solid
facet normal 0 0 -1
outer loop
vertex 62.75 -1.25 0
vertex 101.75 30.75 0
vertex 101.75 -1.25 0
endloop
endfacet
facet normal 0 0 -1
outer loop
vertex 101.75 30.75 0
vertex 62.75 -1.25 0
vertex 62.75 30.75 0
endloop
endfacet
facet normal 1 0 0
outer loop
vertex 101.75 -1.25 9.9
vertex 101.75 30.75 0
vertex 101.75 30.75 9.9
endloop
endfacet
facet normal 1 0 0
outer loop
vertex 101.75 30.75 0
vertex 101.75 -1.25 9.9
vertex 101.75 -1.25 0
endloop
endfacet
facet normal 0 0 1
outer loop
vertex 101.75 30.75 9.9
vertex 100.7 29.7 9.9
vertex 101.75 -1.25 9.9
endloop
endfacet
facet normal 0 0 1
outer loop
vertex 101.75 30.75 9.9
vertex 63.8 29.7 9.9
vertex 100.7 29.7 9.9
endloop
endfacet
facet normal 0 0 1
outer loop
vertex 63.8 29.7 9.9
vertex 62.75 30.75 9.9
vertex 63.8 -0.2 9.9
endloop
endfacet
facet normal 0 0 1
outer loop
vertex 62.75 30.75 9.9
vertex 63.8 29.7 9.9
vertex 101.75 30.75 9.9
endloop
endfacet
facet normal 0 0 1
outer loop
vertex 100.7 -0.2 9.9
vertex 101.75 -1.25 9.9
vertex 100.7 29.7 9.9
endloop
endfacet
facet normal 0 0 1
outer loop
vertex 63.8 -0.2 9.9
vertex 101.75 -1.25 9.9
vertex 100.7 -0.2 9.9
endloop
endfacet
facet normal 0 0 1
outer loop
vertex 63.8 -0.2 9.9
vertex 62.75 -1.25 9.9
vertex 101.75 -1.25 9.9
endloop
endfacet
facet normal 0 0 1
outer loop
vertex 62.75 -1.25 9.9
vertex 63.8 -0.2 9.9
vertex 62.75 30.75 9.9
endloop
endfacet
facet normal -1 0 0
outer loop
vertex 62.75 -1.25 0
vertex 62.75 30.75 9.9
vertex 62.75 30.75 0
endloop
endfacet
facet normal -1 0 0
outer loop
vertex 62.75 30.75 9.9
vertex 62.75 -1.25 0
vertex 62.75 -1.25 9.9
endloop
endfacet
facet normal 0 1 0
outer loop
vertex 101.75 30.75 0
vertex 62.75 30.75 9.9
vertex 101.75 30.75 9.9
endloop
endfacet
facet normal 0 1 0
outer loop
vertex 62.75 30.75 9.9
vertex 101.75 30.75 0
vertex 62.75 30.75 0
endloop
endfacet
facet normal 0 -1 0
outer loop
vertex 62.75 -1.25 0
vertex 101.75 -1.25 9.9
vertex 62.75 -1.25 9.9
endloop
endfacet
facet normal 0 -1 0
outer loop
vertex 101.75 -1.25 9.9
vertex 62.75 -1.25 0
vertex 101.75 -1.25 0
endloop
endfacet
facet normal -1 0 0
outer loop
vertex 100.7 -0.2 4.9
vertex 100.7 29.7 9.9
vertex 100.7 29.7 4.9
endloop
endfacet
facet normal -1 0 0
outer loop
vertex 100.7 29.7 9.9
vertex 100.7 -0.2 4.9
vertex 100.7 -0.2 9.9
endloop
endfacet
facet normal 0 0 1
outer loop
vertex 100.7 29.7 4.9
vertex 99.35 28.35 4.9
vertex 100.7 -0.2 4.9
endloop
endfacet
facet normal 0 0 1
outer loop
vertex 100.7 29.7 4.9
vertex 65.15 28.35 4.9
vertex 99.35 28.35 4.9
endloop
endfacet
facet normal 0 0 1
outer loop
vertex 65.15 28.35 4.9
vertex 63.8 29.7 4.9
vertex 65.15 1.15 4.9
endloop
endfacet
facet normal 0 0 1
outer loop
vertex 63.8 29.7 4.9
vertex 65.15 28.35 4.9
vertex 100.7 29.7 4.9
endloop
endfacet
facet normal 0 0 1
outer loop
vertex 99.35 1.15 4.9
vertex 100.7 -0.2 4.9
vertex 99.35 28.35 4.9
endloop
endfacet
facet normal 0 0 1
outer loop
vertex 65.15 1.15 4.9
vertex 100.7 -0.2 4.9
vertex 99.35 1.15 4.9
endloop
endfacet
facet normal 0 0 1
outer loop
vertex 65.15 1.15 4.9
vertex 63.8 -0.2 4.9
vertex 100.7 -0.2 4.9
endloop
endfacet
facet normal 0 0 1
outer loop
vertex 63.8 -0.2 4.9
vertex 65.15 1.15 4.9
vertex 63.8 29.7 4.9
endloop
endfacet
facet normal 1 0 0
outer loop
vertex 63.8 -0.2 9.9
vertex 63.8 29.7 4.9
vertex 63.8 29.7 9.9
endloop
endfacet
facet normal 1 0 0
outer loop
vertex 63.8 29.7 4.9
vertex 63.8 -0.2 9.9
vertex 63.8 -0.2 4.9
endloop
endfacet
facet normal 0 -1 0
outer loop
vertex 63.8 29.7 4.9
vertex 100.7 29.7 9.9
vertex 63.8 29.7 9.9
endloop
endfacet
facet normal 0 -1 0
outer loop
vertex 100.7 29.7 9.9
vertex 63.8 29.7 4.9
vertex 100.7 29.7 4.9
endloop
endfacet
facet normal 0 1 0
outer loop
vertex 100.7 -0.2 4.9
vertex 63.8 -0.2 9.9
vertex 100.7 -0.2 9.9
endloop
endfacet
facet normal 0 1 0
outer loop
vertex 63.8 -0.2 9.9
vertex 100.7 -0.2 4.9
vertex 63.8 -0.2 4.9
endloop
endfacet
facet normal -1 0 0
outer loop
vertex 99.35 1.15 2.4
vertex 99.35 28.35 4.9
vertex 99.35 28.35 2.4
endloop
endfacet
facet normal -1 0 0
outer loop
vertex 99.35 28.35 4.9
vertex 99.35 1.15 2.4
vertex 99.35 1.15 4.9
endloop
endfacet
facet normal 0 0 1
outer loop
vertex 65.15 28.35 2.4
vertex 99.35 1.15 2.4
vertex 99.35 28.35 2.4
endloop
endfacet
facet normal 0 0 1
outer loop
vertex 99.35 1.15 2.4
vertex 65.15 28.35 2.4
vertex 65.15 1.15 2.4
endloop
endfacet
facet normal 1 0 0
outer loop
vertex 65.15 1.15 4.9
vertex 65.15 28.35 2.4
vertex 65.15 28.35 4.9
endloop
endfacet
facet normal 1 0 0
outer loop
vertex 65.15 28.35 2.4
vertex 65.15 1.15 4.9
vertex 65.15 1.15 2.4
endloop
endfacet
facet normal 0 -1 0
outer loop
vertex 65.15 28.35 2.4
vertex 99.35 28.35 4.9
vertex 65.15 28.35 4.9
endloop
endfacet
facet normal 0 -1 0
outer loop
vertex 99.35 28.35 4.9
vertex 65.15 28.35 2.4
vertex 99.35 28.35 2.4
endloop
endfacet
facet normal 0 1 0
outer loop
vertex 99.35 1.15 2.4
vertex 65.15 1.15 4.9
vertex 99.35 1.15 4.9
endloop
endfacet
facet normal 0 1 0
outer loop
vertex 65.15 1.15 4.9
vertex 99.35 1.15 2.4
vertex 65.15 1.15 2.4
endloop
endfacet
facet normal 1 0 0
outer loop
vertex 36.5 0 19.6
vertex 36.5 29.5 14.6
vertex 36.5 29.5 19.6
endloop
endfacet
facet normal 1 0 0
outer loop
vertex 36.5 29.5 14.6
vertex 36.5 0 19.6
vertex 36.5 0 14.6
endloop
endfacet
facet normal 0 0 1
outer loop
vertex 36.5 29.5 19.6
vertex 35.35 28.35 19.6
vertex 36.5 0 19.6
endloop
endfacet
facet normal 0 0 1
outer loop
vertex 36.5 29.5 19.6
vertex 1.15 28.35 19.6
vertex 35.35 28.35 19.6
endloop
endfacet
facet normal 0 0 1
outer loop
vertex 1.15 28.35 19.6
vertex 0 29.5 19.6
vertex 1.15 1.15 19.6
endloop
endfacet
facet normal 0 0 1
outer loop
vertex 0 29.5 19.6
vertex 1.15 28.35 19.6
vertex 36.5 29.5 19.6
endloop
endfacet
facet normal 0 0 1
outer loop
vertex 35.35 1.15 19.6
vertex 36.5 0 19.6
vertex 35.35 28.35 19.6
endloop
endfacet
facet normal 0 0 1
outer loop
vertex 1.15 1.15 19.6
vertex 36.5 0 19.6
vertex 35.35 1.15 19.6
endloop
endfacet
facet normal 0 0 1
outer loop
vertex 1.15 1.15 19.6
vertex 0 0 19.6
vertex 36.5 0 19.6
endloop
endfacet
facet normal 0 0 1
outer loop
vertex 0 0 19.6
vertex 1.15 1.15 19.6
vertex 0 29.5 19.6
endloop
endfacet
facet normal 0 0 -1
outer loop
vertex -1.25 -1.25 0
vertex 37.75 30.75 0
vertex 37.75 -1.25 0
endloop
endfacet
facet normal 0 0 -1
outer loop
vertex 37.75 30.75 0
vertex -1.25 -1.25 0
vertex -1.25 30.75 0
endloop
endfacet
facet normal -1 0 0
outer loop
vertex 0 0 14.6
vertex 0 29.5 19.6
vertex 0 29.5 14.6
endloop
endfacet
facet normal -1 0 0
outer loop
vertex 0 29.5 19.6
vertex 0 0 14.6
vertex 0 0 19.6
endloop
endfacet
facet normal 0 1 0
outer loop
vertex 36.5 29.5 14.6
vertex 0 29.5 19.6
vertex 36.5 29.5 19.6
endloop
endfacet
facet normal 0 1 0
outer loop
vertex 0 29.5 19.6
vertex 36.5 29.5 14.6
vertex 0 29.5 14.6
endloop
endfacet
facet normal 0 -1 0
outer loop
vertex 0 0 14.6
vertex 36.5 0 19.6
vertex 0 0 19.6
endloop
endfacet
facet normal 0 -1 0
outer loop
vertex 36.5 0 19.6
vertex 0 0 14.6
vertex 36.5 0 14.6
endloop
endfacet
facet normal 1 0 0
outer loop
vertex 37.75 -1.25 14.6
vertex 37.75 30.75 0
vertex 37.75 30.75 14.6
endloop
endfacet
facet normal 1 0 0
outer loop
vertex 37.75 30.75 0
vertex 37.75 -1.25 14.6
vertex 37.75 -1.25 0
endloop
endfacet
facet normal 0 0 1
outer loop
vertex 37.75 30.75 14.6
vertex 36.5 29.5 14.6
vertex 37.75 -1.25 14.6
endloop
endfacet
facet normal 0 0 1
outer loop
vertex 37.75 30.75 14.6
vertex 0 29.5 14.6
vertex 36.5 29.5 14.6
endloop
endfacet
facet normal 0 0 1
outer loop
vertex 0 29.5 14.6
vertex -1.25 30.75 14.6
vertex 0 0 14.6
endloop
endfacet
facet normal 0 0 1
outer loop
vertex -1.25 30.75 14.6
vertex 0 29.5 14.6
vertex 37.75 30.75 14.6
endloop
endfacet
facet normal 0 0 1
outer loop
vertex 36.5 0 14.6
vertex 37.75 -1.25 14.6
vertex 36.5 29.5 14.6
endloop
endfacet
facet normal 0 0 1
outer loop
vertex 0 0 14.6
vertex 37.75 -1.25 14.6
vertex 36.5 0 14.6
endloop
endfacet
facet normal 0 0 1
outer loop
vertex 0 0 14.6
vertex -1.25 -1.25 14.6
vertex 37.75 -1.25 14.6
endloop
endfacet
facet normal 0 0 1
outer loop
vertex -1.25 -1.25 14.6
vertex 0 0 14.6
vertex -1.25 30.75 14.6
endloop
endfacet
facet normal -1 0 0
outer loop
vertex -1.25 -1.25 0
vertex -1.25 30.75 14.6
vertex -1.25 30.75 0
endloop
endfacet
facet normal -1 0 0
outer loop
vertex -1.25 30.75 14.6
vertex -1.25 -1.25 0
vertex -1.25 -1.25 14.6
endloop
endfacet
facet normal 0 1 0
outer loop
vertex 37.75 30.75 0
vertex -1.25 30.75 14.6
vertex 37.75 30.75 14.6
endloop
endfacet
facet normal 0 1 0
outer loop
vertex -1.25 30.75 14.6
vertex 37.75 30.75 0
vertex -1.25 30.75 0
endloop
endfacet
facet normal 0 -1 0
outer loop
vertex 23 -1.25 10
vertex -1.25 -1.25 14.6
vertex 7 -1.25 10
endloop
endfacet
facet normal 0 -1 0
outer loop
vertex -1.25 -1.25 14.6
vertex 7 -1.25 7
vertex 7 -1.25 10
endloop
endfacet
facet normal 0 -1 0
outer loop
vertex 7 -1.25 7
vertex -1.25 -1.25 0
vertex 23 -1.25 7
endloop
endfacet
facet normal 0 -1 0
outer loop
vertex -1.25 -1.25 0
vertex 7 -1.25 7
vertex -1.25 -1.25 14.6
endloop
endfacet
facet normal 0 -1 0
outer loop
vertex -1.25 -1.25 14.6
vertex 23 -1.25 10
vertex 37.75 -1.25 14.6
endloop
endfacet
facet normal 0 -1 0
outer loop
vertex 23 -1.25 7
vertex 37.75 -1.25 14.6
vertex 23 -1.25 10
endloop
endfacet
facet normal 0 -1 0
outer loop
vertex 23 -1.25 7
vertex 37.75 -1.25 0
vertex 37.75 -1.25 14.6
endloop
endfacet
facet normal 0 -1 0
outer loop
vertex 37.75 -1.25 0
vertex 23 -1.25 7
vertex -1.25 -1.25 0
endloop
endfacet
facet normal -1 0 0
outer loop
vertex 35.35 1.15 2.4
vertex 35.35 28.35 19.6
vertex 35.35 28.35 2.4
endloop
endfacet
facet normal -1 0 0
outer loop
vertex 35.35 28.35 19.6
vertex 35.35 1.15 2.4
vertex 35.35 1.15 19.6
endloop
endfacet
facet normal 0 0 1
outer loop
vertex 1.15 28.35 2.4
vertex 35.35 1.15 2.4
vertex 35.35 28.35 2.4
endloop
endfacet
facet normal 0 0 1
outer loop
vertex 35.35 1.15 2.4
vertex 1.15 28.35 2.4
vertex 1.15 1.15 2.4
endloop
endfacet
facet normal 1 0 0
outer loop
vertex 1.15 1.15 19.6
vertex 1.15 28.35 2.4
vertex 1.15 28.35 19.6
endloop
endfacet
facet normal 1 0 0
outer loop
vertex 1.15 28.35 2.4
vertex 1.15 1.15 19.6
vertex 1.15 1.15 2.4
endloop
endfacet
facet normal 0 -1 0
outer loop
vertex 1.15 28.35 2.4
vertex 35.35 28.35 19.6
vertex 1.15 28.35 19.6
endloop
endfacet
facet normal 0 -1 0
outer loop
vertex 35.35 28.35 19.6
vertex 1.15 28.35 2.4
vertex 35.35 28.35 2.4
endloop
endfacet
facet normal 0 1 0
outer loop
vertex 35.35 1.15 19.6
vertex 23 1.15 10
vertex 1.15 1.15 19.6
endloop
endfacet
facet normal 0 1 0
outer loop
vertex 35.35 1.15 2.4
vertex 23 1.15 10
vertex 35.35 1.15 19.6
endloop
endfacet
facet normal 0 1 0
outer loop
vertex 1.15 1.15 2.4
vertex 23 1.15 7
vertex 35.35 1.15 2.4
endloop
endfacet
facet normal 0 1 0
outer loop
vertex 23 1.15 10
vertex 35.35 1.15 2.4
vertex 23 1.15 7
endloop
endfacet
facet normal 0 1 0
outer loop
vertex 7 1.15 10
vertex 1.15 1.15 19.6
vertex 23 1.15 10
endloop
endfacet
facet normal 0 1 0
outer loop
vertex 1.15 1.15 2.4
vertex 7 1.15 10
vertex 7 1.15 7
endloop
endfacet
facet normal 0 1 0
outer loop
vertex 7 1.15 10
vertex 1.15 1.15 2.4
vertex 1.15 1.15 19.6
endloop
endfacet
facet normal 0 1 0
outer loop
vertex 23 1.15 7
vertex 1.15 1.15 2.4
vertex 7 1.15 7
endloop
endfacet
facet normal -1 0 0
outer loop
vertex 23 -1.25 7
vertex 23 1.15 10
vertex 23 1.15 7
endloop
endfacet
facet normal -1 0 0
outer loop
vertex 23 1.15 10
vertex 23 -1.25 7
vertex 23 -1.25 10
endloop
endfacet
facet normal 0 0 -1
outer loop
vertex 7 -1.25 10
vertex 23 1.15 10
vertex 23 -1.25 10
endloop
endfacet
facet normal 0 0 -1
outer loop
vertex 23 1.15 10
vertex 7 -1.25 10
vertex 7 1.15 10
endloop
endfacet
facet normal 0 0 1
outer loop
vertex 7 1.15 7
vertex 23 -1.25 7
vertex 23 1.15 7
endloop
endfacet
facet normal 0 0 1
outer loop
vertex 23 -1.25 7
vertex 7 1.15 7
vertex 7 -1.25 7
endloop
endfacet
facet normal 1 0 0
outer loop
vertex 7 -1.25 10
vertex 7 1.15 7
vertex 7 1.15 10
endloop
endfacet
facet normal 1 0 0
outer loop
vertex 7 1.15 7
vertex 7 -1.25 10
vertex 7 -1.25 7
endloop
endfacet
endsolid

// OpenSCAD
// This is a copy of the Moo card holder. Consider the other canonical

print_top();

difference(){
  print_bottom();
  translate([7,-2,7])
  // hole for wires
   cube([16,5,3]);
  }

// Extra space on the inside. This is added to the inner dimensions.
inner_padding=2;

// Inner width of the box. moo minicards are 28mm.
inner_width=32;

// Inner length of the box.
inner_length=25;

// Inner height of the box. moo minicards are 70mm.
inner_height=20;

// The width of the walls.
wall=2.5;

// The amount of overlap between the lid and the body.
overlap=5;

// The location of the split, as a value between 0.0 and 1.0.
split_ratio=0.8;

// The amount of clearance between 3D printed parts that need to fit together.
clearance=0.2;


module bottom(i_x, i_y, i_z, ext_offset, split_z){
  difference(){
    union(){
      // The inner cube that surrounds the cavity
      cube([i_x + wall, i_y + wall, (i_z + wall) * split_z]);

      // The outer cube that makes the outer box
      translate([-wall/2,-wall/2,0]){
	cube([i_x + wall*2, i_y + wall*2, (i_z + wall) * split_z + ext_offset]);
      }
    }
    translate([-clearance, -clearance, (i_z + wall) * (split_z)]){
      cube([i_x + wall + clearance*2, i_y + wall + clearance*2, i_z * (1-split_z)]);
    }

    // the cavity
    translate([wall/2 -clearance/2, wall/2 -clearance/2, wall -clearance/2]){
      cube([i_x+clearance, i_y+clearance, i_z+clearance]);
    }
  }
}

// Top

module print_top(){
  translate([inner_width * 2, 0, 0]){
    bottom(inner_width + inner_padding, inner_length + inner_padding, inner_height + inner_padding, overlap, 1-split_ratio);
  }
}

module print_bottom(){
  // Bottom
  bottom(inner_width + inner_padding, inner_length + inner_padding, inner_height + inner_padding, -overlap, split_ratio);
}

/* test card */
% translate([wall,wall,wall]){
  cube([inner_width,0.5,70]);
}
